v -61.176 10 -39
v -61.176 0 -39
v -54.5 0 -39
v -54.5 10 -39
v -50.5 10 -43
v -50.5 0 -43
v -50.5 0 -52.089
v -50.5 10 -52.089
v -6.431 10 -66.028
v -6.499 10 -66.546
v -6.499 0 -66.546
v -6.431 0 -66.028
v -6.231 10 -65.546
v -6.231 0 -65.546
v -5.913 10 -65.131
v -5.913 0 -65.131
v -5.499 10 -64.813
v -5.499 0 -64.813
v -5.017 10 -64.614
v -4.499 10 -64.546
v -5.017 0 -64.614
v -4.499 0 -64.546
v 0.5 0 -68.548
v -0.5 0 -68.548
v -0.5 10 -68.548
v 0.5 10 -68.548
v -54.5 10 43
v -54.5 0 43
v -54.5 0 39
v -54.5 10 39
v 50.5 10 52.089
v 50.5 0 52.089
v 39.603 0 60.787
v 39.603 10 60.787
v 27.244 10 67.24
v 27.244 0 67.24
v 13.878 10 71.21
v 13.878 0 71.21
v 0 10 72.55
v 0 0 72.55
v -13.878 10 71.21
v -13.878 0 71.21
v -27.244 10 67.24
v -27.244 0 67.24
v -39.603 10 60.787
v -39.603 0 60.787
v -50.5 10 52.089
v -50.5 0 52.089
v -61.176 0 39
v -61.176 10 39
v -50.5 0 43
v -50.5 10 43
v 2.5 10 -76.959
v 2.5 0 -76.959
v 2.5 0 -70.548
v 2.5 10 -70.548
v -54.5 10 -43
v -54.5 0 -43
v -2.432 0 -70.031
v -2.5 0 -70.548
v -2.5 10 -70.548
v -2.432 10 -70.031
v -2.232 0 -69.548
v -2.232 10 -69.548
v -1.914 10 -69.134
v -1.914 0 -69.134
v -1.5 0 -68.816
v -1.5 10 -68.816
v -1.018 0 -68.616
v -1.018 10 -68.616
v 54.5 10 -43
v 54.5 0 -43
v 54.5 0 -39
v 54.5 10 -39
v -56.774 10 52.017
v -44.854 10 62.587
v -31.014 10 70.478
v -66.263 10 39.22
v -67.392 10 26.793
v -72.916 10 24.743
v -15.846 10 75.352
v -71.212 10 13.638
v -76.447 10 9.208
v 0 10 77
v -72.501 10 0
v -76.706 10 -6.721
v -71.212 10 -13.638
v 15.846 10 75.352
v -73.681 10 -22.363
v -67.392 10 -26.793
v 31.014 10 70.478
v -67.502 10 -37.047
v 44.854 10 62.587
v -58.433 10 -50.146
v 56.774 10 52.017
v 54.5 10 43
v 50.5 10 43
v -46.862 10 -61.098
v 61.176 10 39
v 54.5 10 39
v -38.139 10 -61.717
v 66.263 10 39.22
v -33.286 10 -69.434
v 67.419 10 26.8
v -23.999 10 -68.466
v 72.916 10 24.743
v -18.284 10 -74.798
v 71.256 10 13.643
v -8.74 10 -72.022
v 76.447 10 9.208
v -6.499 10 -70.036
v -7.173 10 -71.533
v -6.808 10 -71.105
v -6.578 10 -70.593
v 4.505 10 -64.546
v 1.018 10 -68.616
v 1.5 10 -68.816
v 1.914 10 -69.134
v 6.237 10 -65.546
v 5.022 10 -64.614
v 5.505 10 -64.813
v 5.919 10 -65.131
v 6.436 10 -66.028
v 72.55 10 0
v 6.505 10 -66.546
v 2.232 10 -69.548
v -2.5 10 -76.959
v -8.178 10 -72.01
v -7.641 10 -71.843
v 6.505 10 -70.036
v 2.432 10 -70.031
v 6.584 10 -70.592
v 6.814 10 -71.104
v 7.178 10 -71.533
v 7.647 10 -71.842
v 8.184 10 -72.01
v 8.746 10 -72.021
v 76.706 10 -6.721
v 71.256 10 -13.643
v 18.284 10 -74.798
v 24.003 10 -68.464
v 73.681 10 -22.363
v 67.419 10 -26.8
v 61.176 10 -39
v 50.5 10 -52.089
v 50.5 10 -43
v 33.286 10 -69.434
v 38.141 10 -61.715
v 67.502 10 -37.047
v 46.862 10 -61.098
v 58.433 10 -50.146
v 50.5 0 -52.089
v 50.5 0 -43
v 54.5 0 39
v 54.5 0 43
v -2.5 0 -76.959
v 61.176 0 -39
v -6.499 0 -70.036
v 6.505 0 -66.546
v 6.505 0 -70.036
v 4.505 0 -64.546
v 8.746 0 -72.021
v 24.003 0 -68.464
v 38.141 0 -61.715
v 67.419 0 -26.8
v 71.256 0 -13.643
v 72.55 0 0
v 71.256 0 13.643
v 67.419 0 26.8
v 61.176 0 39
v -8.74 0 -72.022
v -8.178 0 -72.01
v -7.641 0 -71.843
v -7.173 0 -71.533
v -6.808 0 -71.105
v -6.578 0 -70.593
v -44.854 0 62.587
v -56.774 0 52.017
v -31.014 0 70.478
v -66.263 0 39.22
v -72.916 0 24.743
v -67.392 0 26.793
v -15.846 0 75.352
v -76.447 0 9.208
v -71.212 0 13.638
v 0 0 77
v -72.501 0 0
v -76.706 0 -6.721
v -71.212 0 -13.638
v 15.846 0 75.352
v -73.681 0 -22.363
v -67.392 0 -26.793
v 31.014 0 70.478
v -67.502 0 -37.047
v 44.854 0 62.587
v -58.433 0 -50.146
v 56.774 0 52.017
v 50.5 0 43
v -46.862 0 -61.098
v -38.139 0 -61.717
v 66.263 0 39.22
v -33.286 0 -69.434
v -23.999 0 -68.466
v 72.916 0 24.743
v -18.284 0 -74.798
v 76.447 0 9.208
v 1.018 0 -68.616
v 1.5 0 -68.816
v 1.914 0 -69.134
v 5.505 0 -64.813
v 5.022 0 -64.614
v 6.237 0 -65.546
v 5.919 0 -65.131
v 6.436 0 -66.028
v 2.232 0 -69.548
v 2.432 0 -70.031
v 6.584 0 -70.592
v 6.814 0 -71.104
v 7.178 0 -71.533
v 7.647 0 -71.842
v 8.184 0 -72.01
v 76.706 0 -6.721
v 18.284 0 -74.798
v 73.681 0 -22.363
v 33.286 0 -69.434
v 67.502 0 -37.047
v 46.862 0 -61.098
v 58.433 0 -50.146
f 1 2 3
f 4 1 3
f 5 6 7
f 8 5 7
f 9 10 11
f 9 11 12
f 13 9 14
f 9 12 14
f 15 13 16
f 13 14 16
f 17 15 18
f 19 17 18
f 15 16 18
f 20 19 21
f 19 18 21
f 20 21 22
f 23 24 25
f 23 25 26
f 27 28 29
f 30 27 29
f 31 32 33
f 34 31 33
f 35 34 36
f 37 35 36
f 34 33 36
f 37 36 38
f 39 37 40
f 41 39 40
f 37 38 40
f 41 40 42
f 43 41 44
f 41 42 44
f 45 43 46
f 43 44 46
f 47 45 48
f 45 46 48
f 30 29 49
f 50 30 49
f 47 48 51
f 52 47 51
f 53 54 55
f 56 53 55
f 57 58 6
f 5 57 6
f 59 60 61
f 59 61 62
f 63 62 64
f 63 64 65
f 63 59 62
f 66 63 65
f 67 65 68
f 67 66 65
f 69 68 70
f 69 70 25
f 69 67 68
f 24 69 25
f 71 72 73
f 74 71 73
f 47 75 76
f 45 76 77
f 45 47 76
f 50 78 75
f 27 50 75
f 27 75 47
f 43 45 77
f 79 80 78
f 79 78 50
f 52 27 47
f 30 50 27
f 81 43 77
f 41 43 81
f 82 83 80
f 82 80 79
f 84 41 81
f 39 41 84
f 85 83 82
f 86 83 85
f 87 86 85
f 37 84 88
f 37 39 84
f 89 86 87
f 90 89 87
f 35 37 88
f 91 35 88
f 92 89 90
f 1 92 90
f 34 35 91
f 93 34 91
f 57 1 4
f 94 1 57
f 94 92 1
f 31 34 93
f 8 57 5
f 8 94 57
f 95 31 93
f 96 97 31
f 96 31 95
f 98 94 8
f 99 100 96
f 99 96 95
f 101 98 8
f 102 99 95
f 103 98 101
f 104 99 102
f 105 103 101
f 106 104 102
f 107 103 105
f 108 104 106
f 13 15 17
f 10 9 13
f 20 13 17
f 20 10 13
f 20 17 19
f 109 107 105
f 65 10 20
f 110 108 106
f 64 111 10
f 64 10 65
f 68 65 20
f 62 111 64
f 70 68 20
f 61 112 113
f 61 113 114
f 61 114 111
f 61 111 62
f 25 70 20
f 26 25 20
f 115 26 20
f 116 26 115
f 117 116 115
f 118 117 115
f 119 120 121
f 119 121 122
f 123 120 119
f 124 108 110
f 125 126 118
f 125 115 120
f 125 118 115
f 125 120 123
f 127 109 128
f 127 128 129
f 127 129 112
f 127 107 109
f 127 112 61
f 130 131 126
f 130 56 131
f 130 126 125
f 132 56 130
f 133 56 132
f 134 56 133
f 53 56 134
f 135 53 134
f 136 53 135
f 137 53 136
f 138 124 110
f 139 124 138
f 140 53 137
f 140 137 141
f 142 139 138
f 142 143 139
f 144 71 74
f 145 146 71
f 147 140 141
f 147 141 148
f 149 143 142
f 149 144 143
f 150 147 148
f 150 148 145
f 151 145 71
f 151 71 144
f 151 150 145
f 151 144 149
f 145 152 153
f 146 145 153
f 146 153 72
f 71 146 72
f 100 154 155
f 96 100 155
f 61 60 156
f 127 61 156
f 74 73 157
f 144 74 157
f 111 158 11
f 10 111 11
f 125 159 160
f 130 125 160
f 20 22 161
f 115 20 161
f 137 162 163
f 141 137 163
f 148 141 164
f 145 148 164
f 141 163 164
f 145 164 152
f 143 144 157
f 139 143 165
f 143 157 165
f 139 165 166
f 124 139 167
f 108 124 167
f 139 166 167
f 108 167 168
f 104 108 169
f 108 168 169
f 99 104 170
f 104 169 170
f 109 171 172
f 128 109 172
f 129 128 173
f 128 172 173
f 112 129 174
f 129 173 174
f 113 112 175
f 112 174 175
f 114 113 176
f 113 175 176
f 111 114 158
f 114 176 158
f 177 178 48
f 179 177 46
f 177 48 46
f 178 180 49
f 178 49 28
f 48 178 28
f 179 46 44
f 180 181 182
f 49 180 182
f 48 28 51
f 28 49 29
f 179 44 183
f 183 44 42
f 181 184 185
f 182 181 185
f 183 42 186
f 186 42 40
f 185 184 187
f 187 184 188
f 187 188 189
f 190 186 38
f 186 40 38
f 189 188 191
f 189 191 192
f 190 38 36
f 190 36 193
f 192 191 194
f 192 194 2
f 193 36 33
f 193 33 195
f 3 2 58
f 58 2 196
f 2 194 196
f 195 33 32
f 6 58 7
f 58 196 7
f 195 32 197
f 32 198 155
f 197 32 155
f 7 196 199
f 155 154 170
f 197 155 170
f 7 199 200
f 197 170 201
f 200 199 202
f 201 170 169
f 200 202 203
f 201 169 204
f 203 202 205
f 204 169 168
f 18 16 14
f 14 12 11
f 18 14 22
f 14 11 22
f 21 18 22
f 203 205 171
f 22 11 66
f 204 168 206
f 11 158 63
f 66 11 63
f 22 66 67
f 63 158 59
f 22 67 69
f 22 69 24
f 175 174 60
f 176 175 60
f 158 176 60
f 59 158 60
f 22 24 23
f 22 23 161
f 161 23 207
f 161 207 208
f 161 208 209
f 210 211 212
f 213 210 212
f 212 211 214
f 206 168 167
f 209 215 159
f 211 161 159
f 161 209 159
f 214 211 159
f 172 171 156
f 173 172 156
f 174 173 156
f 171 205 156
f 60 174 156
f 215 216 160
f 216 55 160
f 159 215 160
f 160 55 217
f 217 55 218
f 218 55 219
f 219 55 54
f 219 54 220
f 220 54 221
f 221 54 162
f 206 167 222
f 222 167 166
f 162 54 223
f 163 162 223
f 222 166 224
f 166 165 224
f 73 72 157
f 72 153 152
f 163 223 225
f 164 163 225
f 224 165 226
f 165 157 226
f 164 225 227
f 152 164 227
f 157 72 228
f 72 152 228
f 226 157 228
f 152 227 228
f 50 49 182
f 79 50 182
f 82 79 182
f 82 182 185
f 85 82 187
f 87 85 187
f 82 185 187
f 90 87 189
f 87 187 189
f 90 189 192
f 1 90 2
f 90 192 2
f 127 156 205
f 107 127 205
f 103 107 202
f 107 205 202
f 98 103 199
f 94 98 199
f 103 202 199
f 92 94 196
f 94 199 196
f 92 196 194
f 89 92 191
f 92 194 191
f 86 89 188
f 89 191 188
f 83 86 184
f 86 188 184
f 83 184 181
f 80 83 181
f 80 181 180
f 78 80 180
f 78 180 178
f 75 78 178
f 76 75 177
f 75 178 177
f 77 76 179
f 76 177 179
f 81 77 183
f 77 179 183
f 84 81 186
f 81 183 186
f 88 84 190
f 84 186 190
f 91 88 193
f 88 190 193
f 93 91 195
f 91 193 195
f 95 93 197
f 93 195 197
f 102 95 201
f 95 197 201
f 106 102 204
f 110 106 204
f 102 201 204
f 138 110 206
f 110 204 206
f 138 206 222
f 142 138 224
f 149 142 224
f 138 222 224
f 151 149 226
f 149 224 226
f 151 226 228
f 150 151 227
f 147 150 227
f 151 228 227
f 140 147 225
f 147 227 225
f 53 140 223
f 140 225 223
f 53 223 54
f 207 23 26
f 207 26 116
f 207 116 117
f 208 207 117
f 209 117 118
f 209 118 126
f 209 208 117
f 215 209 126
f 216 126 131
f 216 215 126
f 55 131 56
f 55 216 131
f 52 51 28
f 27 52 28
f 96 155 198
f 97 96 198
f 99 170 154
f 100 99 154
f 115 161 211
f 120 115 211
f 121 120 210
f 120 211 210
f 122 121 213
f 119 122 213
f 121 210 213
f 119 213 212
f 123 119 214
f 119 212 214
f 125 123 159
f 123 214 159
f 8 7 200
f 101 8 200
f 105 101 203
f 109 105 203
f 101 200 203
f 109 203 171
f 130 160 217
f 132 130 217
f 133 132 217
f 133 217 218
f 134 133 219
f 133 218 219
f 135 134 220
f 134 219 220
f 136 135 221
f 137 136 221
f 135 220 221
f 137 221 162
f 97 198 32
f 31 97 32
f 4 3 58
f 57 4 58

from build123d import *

# Parameters (mm, degrees)
BOSS_EXTRUDE1_DEPTH = 10
BOSS_EXTRUDE2_START = -10
BOSS_EXTRUDE2_DEPTH = 10


with BuildPart() as part:
    # Sketch1 → Boss-Extrude1 (new body)
    with BuildSketch(Plane(origin=(0, 0, 0), x_dir=(1, 0, 0), z_dir=(0, 1, 0))):
        with BuildLine():
            Line((-0.5, 68.548309499), (0.5, 68.548309499))
            ThreePointArc((0.5, 68.548309499), (1.914213562, 69.134095936), (2.5, 70.548309499))
            Line((2.5, 70.548309499), (2.5, 76.509166118))
            ThreePointArc((2.5, 76.509166118), (0, -76.55), (-2.5, 76.509166118))
            Line((-2.5, 76.509166118), (-2.5, 70.548309499))
            ThreePointArc((-2.5, 70.548309499), (-1.914213562, 69.134095936), (-0.5, 68.548309499))
        make_face()
        with BuildLine():
            Line((-4.498898253, 64.545545648), (4.504620523, 64.545545648))
            ThreePointArc((4.504620523, 64.545545648), (5.918834085, 65.131332086), (6.504620523, 66.545545648))
            Line((6.504620523, 66.545545648), (6.504620523, 70.035519058))
            ThreePointArc((6.504620523, 70.035519058), (7.178383305, 71.532547729), (8.745715364, 72.020934198))
            ThreePointArc((8.745715364, 72.020934198), (31.254364336, 65.472644745), (50.5, 52.08889037))
            Line((50.5, 52.08889037), (50.5, 43))
            Line((50.5, 43), (54.5, 43))
            Line((54.5, 43), (54.5, 39))
            Line((54.5, 39), (61.17599611, 39))
            ThreePointArc((61.17599611, 39), (72.55, 0), (61.17599611, -39))
            Line((61.17599611, -39), (54.5, -39))
            Line((54.5, -39), (54.5, -43))
            Line((54.5, -43), (50.5, -43))
            Line((50.5, -43), (50.5, -52.08889037))
            ThreePointArc((50.5, -52.08889037), (0, -72.55), (-50.5, -52.08889037))
            Line((-50.5, -52.08889037), (-50.5, -43))
            Line((-50.5, -43), (-54.5, -43))
            Line((-54.5, -43), (-54.5, -39))
            Line((-54.5, -39), (-61.17599611, -39))
            ThreePointArc((-61.17599611, -39), (-72.50088526, 0), (-61.17599611, 39))
            Line((-61.17599611, 39), (-54.5, 39))
            Line((-54.5, 39), (-54.5, 43))
            Line((-54.5, 43), (-50.5, 43))
            Line((-50.5, 43), (-50.5, 52.08889037))
            ThreePointArc((-50.5, 52.08889037), (-31.251689593, 65.473921507), (-8.739830875, 72.021648525))
            ThreePointArc((-8.739830875, 72.021648525), (-7.172599878, 71.533188183), (-6.498898253, 70.036213693))
            Line((-6.498898253, 70.036213693), (-6.498898253, 66.545545648))
            ThreePointArc((-6.498898253, 66.545545648), (-5.913111815, 65.131332086), (-4.498898253, 64.545545648))
        make_face(mode=Mode.SUBTRACT)
    extrude(amount=BOSS_EXTRUDE1_DEPTH)

    # Sketch2 → Boss-Extrude2 (add)
    with BuildSketch(Plane(origin=(0, 10, 0), x_dir=(1, 0, 0), z_dir=(0, 1, 0)).offset(BOSS_EXTRUDE2_START)):
        with BuildLine():
            ThreePointArc((2.5, 76.509166118), (0, -76.55), (-2.5, 76.509166118))
            Line((-2.5, 76.509166118), (-2.5, 76.959404883))
            ThreePointArc((-2.5, 76.959404883), (0, -77), (2.5, 76.959404883))
            Line((2.5, 76.959404883), (2.5, 76.509166118))
        make_face()
    extrude(amount=BOSS_EXTRUDE2_DEPTH)


solid = part.part
